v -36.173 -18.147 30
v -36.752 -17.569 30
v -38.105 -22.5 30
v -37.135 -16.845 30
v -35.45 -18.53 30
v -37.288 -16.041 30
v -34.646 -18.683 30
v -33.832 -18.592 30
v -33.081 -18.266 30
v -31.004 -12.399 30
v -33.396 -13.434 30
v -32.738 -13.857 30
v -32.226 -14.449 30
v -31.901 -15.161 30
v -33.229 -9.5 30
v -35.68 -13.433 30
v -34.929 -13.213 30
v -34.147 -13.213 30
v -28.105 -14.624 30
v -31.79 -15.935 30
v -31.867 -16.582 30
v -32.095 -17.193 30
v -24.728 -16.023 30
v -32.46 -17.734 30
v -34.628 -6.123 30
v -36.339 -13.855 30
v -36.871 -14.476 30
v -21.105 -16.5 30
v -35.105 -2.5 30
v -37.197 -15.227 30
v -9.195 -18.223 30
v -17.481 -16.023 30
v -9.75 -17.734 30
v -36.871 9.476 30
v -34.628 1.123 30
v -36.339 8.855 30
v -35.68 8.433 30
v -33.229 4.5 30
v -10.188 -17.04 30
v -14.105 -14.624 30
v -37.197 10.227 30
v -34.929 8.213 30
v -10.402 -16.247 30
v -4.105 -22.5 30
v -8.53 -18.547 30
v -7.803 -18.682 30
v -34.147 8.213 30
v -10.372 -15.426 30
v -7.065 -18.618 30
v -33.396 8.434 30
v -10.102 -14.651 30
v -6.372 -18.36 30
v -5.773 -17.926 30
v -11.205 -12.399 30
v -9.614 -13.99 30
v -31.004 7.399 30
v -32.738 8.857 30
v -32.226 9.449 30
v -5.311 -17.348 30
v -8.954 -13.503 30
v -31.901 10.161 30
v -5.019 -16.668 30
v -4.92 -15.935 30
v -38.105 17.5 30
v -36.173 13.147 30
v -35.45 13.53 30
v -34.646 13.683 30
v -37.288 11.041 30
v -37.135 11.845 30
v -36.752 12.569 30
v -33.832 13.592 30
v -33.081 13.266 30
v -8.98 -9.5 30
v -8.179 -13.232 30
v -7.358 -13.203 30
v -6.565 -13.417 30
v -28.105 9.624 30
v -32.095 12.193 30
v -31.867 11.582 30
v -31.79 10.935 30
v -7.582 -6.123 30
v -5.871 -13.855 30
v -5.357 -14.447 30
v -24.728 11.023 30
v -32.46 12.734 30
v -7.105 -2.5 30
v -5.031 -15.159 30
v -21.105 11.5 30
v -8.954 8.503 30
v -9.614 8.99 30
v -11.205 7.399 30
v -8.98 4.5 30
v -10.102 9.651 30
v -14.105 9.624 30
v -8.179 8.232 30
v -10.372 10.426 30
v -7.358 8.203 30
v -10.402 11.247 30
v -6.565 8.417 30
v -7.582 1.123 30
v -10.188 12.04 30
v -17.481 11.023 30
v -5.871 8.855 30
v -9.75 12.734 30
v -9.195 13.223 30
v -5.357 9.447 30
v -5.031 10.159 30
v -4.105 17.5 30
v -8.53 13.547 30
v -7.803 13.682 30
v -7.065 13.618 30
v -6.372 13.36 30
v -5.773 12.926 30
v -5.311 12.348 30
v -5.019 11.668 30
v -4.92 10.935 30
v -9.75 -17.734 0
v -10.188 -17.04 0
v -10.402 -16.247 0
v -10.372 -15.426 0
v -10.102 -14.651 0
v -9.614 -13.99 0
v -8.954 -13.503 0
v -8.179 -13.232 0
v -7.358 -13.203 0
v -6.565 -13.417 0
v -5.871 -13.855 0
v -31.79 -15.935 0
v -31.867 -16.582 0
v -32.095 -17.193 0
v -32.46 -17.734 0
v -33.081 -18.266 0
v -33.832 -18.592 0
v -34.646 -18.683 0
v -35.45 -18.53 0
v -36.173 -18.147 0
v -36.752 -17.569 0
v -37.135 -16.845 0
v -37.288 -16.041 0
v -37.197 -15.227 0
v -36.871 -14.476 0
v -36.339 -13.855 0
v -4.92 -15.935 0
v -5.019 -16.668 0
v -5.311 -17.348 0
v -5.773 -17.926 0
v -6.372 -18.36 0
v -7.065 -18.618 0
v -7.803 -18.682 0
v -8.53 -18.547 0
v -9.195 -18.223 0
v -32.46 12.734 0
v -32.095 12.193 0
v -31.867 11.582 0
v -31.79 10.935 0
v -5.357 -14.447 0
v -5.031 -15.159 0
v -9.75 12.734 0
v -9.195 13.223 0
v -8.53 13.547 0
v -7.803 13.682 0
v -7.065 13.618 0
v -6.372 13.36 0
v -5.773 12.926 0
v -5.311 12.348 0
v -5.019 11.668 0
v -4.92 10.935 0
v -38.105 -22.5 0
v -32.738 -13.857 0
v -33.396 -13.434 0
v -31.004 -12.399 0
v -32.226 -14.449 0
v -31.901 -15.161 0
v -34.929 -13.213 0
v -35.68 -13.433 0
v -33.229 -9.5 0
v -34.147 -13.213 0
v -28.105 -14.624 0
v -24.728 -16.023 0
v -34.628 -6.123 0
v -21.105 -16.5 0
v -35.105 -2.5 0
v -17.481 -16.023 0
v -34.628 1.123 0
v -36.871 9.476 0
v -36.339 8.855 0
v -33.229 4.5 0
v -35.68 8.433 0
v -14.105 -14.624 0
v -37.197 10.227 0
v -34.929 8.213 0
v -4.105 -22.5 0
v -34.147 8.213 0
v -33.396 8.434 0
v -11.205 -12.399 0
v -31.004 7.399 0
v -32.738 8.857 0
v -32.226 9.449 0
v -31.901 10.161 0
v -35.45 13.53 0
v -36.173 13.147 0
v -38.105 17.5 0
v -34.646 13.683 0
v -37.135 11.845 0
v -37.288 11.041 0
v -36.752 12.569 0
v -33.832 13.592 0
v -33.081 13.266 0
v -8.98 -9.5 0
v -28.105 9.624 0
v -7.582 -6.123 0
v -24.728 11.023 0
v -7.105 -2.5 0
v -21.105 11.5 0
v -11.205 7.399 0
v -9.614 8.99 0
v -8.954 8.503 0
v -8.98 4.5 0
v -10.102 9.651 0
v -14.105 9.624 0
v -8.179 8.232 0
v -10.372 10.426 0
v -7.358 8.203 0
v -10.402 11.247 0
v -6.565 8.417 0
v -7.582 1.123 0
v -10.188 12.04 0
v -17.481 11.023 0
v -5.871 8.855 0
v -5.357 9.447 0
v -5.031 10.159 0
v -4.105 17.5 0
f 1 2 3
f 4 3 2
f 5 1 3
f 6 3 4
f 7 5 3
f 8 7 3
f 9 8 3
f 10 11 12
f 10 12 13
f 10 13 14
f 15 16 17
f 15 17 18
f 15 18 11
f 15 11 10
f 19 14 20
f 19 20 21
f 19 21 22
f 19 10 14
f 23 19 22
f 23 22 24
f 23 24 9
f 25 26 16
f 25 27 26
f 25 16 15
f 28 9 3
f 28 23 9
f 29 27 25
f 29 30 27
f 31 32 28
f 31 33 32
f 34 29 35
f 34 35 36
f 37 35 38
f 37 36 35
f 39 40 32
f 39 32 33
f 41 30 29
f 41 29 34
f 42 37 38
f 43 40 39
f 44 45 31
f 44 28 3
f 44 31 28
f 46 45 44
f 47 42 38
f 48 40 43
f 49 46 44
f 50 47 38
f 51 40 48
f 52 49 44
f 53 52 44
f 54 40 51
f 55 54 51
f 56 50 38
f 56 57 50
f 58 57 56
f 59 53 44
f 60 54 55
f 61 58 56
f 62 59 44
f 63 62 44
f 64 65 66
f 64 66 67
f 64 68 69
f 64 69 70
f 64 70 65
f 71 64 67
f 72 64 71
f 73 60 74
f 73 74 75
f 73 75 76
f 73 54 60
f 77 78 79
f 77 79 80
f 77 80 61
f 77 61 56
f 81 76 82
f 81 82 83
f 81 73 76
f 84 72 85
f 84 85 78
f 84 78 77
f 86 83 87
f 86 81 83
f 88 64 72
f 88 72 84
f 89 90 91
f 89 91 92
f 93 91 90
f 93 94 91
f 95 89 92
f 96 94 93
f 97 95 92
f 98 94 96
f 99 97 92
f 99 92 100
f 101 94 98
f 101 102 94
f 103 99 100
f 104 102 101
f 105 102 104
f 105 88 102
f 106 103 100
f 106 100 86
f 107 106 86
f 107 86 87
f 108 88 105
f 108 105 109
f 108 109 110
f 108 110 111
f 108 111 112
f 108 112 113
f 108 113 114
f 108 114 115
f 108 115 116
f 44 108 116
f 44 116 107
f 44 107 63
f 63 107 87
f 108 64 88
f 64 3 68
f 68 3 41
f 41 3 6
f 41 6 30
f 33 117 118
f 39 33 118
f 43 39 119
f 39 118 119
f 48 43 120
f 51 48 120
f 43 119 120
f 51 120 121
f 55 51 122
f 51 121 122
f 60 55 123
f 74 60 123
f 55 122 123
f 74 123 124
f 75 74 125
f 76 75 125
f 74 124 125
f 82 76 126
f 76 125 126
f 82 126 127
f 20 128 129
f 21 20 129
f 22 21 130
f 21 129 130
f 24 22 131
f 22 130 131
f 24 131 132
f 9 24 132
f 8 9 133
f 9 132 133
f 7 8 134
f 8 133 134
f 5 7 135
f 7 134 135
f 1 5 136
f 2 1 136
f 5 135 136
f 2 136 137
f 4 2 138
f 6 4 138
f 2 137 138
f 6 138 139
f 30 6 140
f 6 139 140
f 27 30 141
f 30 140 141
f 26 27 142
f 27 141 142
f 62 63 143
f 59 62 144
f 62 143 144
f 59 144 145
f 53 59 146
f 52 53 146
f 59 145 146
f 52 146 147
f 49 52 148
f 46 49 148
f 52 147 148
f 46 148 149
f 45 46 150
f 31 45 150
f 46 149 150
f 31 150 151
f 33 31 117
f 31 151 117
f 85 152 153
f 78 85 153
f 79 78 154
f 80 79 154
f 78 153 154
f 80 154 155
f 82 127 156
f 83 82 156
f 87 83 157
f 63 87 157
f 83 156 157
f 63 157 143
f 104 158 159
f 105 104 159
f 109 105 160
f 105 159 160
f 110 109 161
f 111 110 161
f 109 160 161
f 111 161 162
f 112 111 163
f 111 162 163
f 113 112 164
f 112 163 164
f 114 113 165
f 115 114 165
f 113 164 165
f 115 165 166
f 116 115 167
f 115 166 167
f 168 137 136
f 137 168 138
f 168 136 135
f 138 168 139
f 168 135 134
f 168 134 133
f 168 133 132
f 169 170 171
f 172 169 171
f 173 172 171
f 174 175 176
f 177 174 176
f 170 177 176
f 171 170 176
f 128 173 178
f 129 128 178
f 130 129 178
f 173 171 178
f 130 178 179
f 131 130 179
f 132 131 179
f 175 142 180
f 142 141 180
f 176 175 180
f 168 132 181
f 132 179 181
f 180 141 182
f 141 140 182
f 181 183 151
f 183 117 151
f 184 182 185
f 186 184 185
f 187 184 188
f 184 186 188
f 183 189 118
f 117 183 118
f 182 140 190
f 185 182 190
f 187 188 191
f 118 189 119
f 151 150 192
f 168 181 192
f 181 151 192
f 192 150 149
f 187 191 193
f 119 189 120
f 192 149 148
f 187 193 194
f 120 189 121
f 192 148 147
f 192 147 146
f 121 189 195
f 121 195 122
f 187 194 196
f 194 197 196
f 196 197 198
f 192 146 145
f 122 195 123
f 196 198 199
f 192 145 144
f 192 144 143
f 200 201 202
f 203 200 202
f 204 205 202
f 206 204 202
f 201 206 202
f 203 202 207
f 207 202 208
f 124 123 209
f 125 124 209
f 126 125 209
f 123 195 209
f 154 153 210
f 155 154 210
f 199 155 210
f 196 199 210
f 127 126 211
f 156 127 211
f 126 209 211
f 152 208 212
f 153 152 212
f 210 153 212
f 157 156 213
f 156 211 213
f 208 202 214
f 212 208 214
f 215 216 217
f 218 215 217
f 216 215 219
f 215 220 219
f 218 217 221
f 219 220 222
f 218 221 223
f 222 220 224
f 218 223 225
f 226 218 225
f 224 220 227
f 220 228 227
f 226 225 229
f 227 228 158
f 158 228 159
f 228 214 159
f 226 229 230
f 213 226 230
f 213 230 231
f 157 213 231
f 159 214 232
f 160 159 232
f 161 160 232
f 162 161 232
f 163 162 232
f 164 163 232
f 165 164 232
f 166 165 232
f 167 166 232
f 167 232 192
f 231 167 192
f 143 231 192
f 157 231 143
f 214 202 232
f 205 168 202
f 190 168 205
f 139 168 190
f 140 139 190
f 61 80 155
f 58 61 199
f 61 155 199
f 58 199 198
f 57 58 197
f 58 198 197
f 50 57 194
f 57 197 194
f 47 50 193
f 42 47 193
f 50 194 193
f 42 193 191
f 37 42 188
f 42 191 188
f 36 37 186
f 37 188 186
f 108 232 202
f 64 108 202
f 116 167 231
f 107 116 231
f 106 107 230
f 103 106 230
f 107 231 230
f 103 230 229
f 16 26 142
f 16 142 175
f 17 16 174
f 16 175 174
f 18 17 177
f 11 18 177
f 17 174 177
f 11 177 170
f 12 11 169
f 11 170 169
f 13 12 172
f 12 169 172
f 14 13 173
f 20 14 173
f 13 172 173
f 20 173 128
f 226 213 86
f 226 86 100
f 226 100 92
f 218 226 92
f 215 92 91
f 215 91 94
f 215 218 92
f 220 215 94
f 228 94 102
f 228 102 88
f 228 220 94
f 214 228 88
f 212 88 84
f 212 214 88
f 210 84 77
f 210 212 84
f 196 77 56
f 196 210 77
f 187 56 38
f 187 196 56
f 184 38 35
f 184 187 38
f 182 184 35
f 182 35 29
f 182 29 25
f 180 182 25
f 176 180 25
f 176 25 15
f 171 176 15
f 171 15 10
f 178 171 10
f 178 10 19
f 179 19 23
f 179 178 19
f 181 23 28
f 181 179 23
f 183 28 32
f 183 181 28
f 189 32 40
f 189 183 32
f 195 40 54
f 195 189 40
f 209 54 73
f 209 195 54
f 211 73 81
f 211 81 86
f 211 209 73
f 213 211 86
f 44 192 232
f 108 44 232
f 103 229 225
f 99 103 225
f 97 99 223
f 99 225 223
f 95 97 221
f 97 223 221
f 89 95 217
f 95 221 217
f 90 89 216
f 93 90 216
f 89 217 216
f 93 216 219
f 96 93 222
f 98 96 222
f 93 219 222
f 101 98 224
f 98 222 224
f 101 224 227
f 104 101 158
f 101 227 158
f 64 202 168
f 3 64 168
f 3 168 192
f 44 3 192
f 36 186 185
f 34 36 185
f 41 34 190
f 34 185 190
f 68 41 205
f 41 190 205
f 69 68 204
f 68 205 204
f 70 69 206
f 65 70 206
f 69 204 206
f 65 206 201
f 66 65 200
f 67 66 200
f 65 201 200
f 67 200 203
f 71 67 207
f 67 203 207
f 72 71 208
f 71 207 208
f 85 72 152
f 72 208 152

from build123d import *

# Parameters (mm, degrees)
F0_R     = 14
F1_DEPTH = 30


with BuildPart() as f1:
    # F0 (on Top) → F1 (new body)
    with BuildSketch(Plane.XY):
        with BuildLine():
            Line((-23.6665773145, 17.4999972433), (-34.3713387844, 17.4999972433))
            ThreePointArc((-34.3713387844, 17.4999972433), (-36.3151814801, 16.0646276083), (-38.104839623, 14.4410715894))
            Line((-38.104839623, 14.4410715894), (-38.104839623, 5.9852786175))
            ThreePointArc((-38.104839623, 5.9852786175), (-37.2854541079, 7.4593001752), (-36.3385899052, 8.8548575392))
            ThreePointArc((-36.3385899052, 8.8548575392), (-36.4844121138, 12.8795697341), (-32.4596999189, 12.7337475255))
            ThreePointArc((-32.4596999189, 12.7337475255), (-28.3758248379, 15.053708361), (-23.8476290358, 16.3009840854))
            ThreePointArc((-23.8476290358, 16.3009840854), (-23.8240141463, 16.910594262), (-23.6665773145, 17.4999972433))
        make_face()
        with BuildLine():
            Line((-4.104839623, -10.985284131), (-4.104839623, 5.9852786175))
            ThreePointArc((-4.104839623, 5.9852786175), (-4.924225138, 7.4593001752), (-5.8710893408, 8.8548575392))
            ThreePointArc((-5.8710893408, 8.8548575392), (-9.6143544287, 8.9904824376), (-9.7499793271, 12.7337475255))
            ThreePointArc((-9.7499793271, 12.7337475255), (-13.833854408, 15.053708361), (-18.3620502102, 16.3009840854))
            ThreePointArc((-18.3620502102, 16.3009840854), (-21.104839623, 13.7499972433), (-23.8476290358, 16.3009840854))
            ThreePointArc((-23.8476290358, 16.3009840854), (-28.3758248379, 15.053708361), (-32.4596999189, 12.7337475255))
            ThreePointArc((-32.4596999189, 12.7337475255), (-31.9627612206, 11.8947230423), (-31.7898684655, 10.9350260858))
            ThreePointArc((-31.7898684655, 10.9350260858), (-33.3961866827, 8.4341278513), (-36.3385899052, 8.8548575392))
            ThreePointArc((-36.3385899052, 8.8548575392), (-37.2854541079, 7.4593001752), (-38.104839623, 5.9852786175))
            Line((-38.104839623, 5.9852786175), (-38.104839623, -10.985284131))
            ThreePointArc((-38.104839623, -10.985284131), (-37.2854541079, -12.4593056886), (-36.3385899052, -13.8548630526))
            ThreePointArc((-36.3385899052, -13.8548630526), (-33.3961866827, -13.4341333647), (-31.7898684655, -15.9350315993))
            ThreePointArc((-31.7898684655, -15.9350315993), (-31.9627612206, -16.8947285558), (-32.4596999189, -17.7337530389))
            ThreePointArc((-32.4596999189, -17.7337530389), (-28.3758248379, -20.0537138744), (-23.8476290358, -21.3009895988))
            ThreePointArc((-23.8476290358, -21.3009895988), (-21.104839623, -18.7500027567), (-18.3620502102, -21.3009895988))
            ThreePointArc((-18.3620502102, -21.3009895988), (-13.833854408, -20.0537138744), (-9.7499793271, -17.7337530389))
            ThreePointArc((-9.7499793271, -17.7337530389), (-9.6143544287, -13.990487951), (-5.8710893408, -13.8548630526))
            ThreePointArc((-5.8710893408, -13.8548630526), (-4.924225138, -12.4593056886), (-4.104839623, -10.985284131))
        make_face()
        with Locations((-21.104839623, -2.5000027567)):
            Circle(F0_R, mode=Mode.SUBTRACT)
        with BuildLine():
            Line((-4.104839623, 5.9852786175), (-4.104839623, 14.4410715894))
            ThreePointArc((-4.104839623, 14.4410715894), (-5.8944977658, 16.0646276083), (-7.8383404616, 17.4999972433))
            Line((-7.8383404616, 17.4999972433), (-18.5431019315, 17.4999972433))
            ThreePointArc((-18.5431019315, 17.4999972433), (-18.4023150022, 17.0087807672), (-18.354839623, 16.4999972433))
            ThreePointArc((-18.354839623, 16.4999972433), (-18.356642861, 16.4004253728), (-18.3620502102, 16.3009840854))
            ThreePointArc((-18.3620502102, 16.3009840854), (-13.833854408, 15.053708361), (-9.7499793271, 12.7337475255))
            ThreePointArc((-9.7499793271, 12.7337475255), (-6.7101138239, 13.5121333307), (-4.9198107804, 10.9350260858))
            ThreePointArc((-4.9198107804, 10.9350260858), (-5.1689125459, 9.791344303), (-5.8710893408, 8.8548575392))
            ThreePointArc((-5.8710893408, 8.8548575392), (-4.924225138, 7.4593001752), (-4.104839623, 5.9852786175))
        make_face()
        with BuildLine():
            ThreePointArc((-18.3620502102, 16.3009840854), (-21.104839623, 16.4999972433), (-23.8476290358, 16.3009840854))
            ThreePointArc((-23.8476290358, 16.3009840854), (-21.104839623, 13.7499972433), (-18.3620502102, 16.3009840854))
        make_face()
        with BuildLine():
            ThreePointArc((-18.354839623, 16.4999972433), (-18.4023150022, 17.0087807672), (-18.5431019315, 17.4999972433))
            Line((-18.5431019315, 17.4999972433), (-23.6665773145, 17.4999972433))
            ThreePointArc((-23.6665773145, 17.4999972433), (-23.8240141463, 16.910594262), (-23.8476290358, 16.3009840854))
            ThreePointArc((-23.8476290358, 16.3009840854), (-21.104839623, 16.4999972433), (-18.3620502102, 16.3009840854))
            ThreePointArc((-18.3620502102, 16.3009840854), (-18.356642861, 16.4004253728), (-18.354839623, 16.4999972433))
        make_face()
        with BuildLine():
            ThreePointArc((-18.3620502102, -21.3009895988), (-21.104839623, -18.7500027567), (-23.8476290358, -21.3009895988))
            ThreePointArc((-23.8476290358, -21.3009895988), (-21.104839623, -21.5000027567), (-18.3620502102, -21.3009895988))
        make_face()
        with BuildLine():
            ThreePointArc((-38.104839623, -19.4410771028), (-36.3151814801, -21.0646331217), (-34.3713387844, -22.5000027567))
            Line((-34.3713387844, -22.5000027567), (-23.6665773145, -22.5000027567))
            ThreePointArc((-23.6665773145, -22.5000027567), (-23.8240141463, -21.9105997754), (-23.8476290358, -21.3009895988))
            ThreePointArc((-23.8476290358, -21.3009895988), (-28.3758248379, -20.0537138744), (-32.4596999189, -17.7337530389))
            ThreePointArc((-32.4596999189, -17.7337530389), (-36.4844121138, -17.8795752475), (-36.3385899052, -13.8548630526))
            ThreePointArc((-36.3385899052, -13.8548630526), (-37.2854541079, -12.4593056886), (-38.104839623, -10.985284131))
            Line((-38.104839623, -10.985284131), (-38.104839623, -19.4410771028))
        make_face()
        with BuildLine():
            ThreePointArc((-7.8383404616, -22.5000027567), (-5.8944977658, -21.0646331217), (-4.104839623, -19.4410771028))
            Line((-4.104839623, -19.4410771028), (-4.104839623, -10.985284131))
            ThreePointArc((-4.104839623, -10.985284131), (-4.924225138, -12.4593056886), (-5.8710893408, -13.8548630526))
            ThreePointArc((-5.8710893408, -13.8548630526), (-5.1689125459, -14.7913498164), (-4.9198107804, -15.9350315993))
            ThreePointArc((-4.9198107804, -15.9350315993), (-6.7101138239, -18.5121388441), (-9.7499793271, -17.7337530389))
            ThreePointArc((-9.7499793271, -17.7337530389), (-13.833854408, -20.0537138744), (-18.3620502102, -21.3009895988))
            ThreePointArc((-18.3620502102, -21.3009895988), (-18.356642861, -21.4004308862), (-18.354839623, -21.5000027567))
            ThreePointArc((-18.354839623, -21.5000027567), (-18.4023150022, -22.0087862806), (-18.5431019315, -22.5000027567))
            Line((-18.5431019315, -22.5000027567), (-7.8383404616, -22.5000027567))
        make_face()
        with BuildLine():
            Line((-4.104839623, -22.5000027567), (-4.104839623, -19.4410771028))
            ThreePointArc((-4.104839623, -19.4410771028), (-5.8944977658, -21.0646331217), (-7.8383404616, -22.5000027567))
            Line((-7.8383404616, -22.5000027567), (-4.104839623, -22.5000027567))
        make_face()
        with BuildLine():
            Line((-38.104839623, -22.5000027567), (-34.3713387844, -22.5000027567))
            ThreePointArc((-34.3713387844, -22.5000027567), (-36.3151814801, -21.0646331217), (-38.104839623, -19.4410771028))
            Line((-38.104839623, -19.4410771028), (-38.104839623, -22.5000027567))
        make_face()
        with BuildLine():
            ThreePointArc((-38.104839623, 14.4410715894), (-36.3151814801, 16.0646276083), (-34.3713387844, 17.4999972433))
            Line((-34.3713387844, 17.4999972433), (-38.104839623, 17.4999972433))
            Line((-38.104839623, 17.4999972433), (-38.104839623, 14.4410715894))
        make_face()
        with BuildLine():
            ThreePointArc((-7.8383404616, 17.4999972433), (-5.8944977658, 16.0646276083), (-4.104839623, 14.4410715894))
            Line((-4.104839623, 14.4410715894), (-4.104839623, 17.4999972433))
            Line((-4.104839623, 17.4999972433), (-7.8383404616, 17.4999972433))
        make_face()
        with BuildLine():
            Line((-23.6665773145, -22.5000027567), (-18.5431019315, -22.5000027567))
            ThreePointArc((-18.5431019315, -22.5000027567), (-18.4023150022, -22.0087862806), (-18.354839623, -21.5000027567))
            ThreePointArc((-18.354839623, -21.5000027567), (-18.356642861, -21.4004308862), (-18.3620502102, -21.3009895988))
            ThreePointArc((-18.3620502102, -21.3009895988), (-21.104839623, -21.5000027567), (-23.8476290358, -21.3009895988))
            ThreePointArc((-23.8476290358, -21.3009895988), (-23.8240141463, -21.9105997754), (-23.6665773145, -22.5000027567))
        make_face()
    extrude(amount=F1_DEPTH)


solid = f1.part
